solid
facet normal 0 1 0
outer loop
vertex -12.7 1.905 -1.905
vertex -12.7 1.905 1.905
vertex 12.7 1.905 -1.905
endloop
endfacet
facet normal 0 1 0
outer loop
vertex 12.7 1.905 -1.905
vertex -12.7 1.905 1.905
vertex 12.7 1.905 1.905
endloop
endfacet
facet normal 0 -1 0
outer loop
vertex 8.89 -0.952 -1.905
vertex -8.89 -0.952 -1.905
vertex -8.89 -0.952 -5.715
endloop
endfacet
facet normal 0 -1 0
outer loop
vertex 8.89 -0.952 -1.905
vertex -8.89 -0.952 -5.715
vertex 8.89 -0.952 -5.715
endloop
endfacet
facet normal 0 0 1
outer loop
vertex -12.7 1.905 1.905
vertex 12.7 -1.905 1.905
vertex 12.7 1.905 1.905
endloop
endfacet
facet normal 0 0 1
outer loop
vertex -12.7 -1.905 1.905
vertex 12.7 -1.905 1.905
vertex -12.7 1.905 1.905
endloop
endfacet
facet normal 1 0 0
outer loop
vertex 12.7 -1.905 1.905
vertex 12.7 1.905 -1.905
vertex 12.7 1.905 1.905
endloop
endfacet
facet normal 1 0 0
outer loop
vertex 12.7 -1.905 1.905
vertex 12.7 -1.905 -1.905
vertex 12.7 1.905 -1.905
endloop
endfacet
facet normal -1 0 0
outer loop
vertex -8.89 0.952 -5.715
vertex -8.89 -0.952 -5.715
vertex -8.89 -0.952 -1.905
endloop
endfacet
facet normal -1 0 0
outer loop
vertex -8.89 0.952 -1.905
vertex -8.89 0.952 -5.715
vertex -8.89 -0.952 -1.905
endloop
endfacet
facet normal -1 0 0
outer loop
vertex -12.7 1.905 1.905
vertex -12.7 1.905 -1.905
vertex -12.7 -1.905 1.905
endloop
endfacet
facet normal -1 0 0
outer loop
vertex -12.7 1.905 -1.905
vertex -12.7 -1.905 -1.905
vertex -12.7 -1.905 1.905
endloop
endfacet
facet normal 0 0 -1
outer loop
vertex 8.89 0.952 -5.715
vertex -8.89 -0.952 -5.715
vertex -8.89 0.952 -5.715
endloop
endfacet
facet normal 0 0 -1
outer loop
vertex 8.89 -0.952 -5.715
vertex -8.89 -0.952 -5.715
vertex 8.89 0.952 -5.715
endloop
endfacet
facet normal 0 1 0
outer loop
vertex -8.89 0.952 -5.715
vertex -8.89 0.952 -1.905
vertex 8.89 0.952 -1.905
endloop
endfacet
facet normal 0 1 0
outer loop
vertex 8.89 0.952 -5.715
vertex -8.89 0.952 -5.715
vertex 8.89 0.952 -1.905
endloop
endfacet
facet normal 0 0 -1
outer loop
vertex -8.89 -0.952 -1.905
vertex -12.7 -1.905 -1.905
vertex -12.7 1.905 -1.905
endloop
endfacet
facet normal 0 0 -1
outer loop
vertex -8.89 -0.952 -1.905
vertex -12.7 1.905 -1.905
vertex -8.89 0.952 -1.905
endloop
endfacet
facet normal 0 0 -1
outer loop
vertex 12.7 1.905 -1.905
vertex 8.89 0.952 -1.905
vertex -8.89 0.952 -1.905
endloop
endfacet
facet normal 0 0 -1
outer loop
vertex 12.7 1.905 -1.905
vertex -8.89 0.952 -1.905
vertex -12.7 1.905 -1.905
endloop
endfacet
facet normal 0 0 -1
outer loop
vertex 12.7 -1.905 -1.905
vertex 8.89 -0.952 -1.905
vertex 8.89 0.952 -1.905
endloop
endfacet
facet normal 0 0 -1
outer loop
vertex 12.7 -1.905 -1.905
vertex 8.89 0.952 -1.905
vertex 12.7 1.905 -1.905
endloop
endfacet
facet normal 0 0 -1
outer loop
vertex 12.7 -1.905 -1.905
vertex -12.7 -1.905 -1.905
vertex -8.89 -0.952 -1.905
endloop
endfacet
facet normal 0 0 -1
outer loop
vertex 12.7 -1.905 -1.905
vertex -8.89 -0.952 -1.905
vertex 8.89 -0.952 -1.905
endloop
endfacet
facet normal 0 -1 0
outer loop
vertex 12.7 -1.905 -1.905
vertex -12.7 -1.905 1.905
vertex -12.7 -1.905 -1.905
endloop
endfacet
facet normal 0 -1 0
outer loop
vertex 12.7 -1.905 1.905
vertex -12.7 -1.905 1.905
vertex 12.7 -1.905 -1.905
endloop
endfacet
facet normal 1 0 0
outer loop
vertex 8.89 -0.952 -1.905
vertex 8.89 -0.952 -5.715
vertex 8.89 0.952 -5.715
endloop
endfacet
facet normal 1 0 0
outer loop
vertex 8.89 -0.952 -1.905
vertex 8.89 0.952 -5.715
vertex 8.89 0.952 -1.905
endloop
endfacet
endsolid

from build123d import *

# Parameters (mm, degrees)
F0_W     = 17.78
F0_H     = 3.81
F0_W_2   = 3.81
F1_DEPTH = 1.905
F2_DEPTH = 0.9525


with BuildPart() as f1:
    # F0 (on Front) → F1 (new body, symmetric)
    with BuildSketch(Plane.XZ):
        Rectangle(F0_W, F0_H)
        with Locations((10.795, 0)):
            Rectangle(F0_W_2, F0_H)
        with Locations((-10.795, 0)):
            Rectangle(F0_W_2, F0_H)
    extrude(amount=F1_DEPTH, both=True)

    # F0 (on Front) → F2 (join, symmetric)
    with BuildSketch(Plane.XZ):
        with Locations((0, -3.81)):
            Rectangle(F0_W, F0_H)
    extrude(amount=F2_DEPTH, both=True)


solid = f1.part
